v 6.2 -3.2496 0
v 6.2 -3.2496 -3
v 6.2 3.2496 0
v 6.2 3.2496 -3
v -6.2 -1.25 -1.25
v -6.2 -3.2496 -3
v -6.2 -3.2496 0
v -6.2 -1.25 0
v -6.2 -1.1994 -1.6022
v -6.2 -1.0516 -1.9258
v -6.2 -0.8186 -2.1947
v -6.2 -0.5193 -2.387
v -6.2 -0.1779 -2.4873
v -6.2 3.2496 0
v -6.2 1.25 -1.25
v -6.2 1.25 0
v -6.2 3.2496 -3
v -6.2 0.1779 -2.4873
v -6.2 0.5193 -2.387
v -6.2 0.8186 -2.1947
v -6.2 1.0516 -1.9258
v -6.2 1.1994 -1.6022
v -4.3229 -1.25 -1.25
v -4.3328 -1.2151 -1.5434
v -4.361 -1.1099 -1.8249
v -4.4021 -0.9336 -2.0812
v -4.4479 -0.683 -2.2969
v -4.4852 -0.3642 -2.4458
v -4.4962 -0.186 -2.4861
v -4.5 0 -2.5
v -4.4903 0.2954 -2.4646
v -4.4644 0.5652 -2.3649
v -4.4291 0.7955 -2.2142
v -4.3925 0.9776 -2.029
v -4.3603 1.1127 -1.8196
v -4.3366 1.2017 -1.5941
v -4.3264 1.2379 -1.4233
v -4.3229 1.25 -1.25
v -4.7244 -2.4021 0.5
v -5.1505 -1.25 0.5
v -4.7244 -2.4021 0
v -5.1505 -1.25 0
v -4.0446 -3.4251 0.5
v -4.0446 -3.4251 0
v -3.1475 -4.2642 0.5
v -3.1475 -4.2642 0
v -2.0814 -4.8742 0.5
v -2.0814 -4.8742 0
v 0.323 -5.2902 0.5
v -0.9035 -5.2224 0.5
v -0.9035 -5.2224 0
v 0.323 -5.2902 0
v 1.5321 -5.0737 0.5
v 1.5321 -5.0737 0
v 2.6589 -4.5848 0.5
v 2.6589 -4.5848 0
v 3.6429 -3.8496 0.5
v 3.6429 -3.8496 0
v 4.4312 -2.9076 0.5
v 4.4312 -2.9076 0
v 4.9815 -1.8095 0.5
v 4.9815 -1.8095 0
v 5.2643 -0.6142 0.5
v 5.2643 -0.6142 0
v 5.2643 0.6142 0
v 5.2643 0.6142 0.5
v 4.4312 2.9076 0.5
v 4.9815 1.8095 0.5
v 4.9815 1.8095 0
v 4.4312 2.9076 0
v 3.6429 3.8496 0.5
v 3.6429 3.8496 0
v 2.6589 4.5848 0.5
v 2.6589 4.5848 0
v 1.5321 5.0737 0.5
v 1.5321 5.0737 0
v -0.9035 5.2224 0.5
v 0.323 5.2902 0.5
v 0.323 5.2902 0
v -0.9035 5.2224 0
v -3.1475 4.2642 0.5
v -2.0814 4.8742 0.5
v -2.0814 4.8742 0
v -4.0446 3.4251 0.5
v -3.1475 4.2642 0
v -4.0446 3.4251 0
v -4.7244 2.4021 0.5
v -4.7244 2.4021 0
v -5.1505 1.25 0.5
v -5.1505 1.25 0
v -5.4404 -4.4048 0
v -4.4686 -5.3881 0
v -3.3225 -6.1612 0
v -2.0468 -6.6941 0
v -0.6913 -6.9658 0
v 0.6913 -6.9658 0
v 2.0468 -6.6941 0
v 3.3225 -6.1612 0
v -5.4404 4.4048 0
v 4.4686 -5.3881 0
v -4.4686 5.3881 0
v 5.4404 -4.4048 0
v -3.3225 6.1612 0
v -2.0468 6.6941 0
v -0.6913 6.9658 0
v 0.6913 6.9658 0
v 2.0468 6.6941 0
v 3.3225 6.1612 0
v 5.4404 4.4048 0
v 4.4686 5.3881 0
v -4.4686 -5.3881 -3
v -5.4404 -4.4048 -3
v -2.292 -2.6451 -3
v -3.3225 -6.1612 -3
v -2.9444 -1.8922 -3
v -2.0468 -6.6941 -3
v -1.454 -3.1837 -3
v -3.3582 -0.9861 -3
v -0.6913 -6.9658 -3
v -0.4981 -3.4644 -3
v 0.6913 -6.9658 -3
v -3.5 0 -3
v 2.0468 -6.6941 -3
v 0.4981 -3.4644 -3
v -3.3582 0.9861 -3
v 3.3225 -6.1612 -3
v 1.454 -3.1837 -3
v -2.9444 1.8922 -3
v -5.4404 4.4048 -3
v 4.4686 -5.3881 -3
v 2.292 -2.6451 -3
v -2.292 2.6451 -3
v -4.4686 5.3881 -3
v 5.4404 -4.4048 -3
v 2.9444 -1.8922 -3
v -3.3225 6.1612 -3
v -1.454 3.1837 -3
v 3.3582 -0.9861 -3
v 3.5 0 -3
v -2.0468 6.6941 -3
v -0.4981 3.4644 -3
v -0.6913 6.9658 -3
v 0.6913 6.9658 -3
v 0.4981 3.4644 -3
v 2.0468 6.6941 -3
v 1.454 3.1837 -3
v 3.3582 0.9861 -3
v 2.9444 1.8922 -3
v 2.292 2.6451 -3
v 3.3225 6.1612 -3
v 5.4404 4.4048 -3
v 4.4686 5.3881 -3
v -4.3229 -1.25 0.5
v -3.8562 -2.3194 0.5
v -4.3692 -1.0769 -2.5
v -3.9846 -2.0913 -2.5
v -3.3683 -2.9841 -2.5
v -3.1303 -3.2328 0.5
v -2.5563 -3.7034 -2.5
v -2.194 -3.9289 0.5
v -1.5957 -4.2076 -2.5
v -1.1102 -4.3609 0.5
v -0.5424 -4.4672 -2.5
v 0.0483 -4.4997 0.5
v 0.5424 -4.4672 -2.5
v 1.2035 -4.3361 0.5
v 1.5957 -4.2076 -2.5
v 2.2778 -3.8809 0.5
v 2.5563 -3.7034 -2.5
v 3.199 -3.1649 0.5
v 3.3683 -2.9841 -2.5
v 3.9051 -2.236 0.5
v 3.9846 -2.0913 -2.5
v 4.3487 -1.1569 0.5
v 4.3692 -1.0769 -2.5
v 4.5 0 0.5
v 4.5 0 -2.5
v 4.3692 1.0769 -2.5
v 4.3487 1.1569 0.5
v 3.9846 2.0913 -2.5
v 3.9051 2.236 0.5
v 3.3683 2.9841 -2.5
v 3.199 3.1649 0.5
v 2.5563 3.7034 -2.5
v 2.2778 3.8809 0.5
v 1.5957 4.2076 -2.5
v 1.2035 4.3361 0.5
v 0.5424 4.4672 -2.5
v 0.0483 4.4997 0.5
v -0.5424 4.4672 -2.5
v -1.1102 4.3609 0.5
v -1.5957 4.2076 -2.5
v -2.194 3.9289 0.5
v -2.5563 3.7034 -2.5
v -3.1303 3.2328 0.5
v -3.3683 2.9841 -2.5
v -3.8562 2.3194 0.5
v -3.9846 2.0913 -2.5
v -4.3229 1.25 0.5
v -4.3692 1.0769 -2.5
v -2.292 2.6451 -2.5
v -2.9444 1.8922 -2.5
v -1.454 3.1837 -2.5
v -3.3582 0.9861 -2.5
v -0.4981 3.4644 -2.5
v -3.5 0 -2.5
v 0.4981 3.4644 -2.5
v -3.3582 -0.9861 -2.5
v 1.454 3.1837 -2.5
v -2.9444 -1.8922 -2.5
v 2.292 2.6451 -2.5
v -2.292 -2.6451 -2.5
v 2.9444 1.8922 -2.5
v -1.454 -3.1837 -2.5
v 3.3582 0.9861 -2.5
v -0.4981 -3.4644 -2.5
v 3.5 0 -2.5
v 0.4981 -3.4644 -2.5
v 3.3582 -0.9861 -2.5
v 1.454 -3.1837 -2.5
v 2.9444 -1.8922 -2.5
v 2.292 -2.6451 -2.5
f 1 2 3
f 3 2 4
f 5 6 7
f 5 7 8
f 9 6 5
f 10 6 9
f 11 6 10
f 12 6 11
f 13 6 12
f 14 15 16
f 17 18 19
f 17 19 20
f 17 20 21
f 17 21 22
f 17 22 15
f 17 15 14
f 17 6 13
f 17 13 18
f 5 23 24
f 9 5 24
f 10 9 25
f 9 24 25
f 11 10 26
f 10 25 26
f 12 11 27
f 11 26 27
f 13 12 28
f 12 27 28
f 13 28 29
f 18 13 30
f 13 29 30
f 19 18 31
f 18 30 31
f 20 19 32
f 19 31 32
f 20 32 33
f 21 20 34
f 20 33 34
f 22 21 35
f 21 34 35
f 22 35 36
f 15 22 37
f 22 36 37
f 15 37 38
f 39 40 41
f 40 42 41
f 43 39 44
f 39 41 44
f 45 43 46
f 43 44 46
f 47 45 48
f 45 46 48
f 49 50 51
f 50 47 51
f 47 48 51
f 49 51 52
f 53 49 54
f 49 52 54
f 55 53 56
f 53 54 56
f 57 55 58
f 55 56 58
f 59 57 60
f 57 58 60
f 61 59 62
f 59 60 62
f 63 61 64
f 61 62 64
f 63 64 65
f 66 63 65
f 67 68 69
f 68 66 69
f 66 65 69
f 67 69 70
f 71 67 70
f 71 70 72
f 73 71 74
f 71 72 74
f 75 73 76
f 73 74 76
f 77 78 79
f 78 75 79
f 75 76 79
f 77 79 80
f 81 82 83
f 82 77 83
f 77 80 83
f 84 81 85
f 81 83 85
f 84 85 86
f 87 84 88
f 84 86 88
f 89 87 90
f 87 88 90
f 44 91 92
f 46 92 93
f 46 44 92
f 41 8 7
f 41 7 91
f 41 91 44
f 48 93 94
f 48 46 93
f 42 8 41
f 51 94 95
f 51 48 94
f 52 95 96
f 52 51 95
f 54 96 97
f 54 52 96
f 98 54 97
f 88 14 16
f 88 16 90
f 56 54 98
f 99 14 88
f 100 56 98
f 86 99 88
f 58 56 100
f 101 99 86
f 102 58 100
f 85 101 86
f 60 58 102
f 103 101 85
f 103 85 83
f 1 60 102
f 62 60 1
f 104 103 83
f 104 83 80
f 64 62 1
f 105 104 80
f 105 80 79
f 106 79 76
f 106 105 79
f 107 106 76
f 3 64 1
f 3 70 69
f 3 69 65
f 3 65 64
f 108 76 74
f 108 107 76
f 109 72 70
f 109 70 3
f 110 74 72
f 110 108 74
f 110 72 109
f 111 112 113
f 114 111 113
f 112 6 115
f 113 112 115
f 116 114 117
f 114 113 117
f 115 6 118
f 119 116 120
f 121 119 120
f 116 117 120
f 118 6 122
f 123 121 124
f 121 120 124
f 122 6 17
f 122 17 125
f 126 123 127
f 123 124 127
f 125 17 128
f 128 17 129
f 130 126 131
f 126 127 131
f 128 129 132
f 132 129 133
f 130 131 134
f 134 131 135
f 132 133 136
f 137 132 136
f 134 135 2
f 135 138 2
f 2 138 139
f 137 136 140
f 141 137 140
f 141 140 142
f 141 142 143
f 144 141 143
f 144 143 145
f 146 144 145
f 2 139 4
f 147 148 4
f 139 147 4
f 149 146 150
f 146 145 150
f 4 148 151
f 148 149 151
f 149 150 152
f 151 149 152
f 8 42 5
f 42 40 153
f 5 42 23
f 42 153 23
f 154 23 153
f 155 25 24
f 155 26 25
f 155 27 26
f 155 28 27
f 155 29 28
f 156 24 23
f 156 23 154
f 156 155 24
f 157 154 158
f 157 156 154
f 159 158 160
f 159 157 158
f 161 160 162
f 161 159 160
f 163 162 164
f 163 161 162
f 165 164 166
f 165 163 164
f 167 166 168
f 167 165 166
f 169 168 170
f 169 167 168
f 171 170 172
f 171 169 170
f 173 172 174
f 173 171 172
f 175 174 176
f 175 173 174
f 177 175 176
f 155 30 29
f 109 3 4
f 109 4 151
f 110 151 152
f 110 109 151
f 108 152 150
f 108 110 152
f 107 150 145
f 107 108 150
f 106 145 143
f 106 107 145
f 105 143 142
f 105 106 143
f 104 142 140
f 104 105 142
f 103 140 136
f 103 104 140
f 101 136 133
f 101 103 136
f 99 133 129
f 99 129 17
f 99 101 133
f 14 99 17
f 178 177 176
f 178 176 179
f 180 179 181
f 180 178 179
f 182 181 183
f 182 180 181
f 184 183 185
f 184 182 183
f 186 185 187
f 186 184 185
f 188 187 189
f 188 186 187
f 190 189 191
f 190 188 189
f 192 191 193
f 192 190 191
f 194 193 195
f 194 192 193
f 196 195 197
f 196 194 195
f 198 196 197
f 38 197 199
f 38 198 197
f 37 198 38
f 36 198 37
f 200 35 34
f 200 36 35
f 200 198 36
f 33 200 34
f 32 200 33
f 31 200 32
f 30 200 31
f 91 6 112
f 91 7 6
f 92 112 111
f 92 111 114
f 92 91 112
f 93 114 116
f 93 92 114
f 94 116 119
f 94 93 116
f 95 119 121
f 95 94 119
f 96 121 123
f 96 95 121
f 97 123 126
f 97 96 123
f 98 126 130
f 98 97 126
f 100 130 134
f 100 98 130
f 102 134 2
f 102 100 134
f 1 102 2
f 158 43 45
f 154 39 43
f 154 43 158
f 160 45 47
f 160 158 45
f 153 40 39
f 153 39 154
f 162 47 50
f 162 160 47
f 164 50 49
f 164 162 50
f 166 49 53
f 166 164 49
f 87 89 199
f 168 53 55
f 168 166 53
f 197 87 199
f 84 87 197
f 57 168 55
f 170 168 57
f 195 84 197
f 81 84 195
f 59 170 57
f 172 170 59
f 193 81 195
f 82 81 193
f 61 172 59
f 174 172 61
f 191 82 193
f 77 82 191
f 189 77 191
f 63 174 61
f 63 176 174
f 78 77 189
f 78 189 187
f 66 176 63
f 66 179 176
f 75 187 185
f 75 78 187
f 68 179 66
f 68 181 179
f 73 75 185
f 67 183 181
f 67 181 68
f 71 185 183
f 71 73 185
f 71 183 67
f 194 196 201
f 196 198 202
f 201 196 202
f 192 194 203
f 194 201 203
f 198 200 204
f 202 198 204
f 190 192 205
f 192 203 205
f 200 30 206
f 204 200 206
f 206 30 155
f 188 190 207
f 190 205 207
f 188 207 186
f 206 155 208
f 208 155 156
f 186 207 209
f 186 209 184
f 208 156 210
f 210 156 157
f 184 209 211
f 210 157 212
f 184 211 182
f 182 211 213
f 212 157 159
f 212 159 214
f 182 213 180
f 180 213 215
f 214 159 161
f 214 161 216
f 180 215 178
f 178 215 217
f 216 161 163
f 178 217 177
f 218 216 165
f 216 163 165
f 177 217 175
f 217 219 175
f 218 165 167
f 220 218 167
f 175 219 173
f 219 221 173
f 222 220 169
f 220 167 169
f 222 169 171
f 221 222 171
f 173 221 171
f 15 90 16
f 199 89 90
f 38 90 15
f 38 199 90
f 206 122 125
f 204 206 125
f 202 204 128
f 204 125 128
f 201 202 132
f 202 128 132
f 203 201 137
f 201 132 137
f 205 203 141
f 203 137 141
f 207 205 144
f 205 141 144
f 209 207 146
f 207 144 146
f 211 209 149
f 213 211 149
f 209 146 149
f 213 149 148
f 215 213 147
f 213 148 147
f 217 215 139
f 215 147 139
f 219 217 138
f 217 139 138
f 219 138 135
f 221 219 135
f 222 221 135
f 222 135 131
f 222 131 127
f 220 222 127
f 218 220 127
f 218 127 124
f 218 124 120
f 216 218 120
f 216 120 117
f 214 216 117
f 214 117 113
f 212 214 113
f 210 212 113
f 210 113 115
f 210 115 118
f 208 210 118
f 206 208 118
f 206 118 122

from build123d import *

# Parameters (mm, degrees)
SKETCH_1_R          = 5.3
SKETCH_1_R_2        = 4.5
EXTRUDE_1_DEPTH     = 0.5
SKETCH_1_4_R        = 7
SKETCH_1_4_R_2      = 5.3
SKETCH_1_4_R_3      = 4.5
EXTRUDE_3_DEPTH     = 3
SKETCH_2_R          = 1.25
SKETCH_2_W          = 2.176030001
SKETCH_2_H          = 2.5
CUT_EXTRUDE_2_DEPTH = 8
SKETCH_3_R          = 7
EXTRUDE_4_DEPTH     = 0.5
SKETCH_4_R          = 3.5
CUT_EXTRUDE_3_DEPTH = 4.5000001
SKETCH_5_W          = 7.173185096
SKETCH_5_H          = 25.447728078
SKETCH_5_W_2        = 11.53458805
SKETCH_5_H_2        = 25.700853956
CUT_EXTRUDE_4_DEPTH = 4.5000001


with BuildPart() as part:
    # Sketch 1 → Extrude 1 (new body)
    with BuildSketch(Plane.XY):
        Circle(SKETCH_1_R)
        Circle(SKETCH_1_R_2, mode=Mode.SUBTRACT)
    extrude(amount=EXTRUDE_1_DEPTH)

    # Sketch 1_4 → Extrude 3 (add)
    with BuildSketch(Plane.XY):
        Circle(SKETCH_1_4_R)
        Circle(SKETCH_1_4_R_2, mode=Mode.SUBTRACT)
        Circle(SKETCH_1_4_R_2)
        Circle(SKETCH_1_4_R_3, mode=Mode.SUBTRACT)
    extrude(amount=-EXTRUDE_3_DEPTH)

    # Sketch 2 → Cut-Extrude 2 (cut, through all)
    with BuildSketch(Plane(origin=(0, 0, 0), x_dir=(0, 0, -1), z_dir=(1, 0, 0))):
        with Locations((1.25, 0)):
            Circle(SKETCH_2_R)
        with Locations((0.161984999, 0)):
            Rectangle(SKETCH_2_W, SKETCH_2_H)
    extrude(amount=-CUT_EXTRUDE_2_DEPTH, mode=Mode.SUBTRACT)

    # Sketch 3 → Extrude 4 (add)
    with BuildSketch(Plane(origin=(0, 0, -3), x_dir=(-1, 0, 0), z_dir=(0, 0, -1))):
        with Locations(Location((0, 0, 0), (0, 0, 180))):  # turned: the seam where the file's is
            Circle(SKETCH_3_R)
    extrude(amount=-EXTRUDE_4_DEPTH)

    # Sketch 4 → Cut-Extrude 3 (cut, through all)
    with BuildSketch(Plane(origin=(0, 0, -3), x_dir=(-1, 0, 0), z_dir=(0, 0, -1))):
        Circle(SKETCH_4_R)
    extrude(amount=-CUT_EXTRUDE_3_DEPTH, mode=Mode.SUBTRACT)

    # Sketch 5 → Cut-Extrude 4 (cut, through all)
    with BuildSketch(Plane(origin=(0, 0, -3), x_dir=(-1, 0, 0), z_dir=(0, 0, -1))):
        with Locations((-9.786592548, -0.021348765)):
            Rectangle(SKETCH_5_W, SKETCH_5_H)
        with Locations((11.967294025, -0.783904042)):
            Rectangle(SKETCH_5_W_2, SKETCH_5_H_2)
    extrude(amount=-CUT_EXTRUDE_4_DEPTH, mode=Mode.SUBTRACT)


solid = part.part
